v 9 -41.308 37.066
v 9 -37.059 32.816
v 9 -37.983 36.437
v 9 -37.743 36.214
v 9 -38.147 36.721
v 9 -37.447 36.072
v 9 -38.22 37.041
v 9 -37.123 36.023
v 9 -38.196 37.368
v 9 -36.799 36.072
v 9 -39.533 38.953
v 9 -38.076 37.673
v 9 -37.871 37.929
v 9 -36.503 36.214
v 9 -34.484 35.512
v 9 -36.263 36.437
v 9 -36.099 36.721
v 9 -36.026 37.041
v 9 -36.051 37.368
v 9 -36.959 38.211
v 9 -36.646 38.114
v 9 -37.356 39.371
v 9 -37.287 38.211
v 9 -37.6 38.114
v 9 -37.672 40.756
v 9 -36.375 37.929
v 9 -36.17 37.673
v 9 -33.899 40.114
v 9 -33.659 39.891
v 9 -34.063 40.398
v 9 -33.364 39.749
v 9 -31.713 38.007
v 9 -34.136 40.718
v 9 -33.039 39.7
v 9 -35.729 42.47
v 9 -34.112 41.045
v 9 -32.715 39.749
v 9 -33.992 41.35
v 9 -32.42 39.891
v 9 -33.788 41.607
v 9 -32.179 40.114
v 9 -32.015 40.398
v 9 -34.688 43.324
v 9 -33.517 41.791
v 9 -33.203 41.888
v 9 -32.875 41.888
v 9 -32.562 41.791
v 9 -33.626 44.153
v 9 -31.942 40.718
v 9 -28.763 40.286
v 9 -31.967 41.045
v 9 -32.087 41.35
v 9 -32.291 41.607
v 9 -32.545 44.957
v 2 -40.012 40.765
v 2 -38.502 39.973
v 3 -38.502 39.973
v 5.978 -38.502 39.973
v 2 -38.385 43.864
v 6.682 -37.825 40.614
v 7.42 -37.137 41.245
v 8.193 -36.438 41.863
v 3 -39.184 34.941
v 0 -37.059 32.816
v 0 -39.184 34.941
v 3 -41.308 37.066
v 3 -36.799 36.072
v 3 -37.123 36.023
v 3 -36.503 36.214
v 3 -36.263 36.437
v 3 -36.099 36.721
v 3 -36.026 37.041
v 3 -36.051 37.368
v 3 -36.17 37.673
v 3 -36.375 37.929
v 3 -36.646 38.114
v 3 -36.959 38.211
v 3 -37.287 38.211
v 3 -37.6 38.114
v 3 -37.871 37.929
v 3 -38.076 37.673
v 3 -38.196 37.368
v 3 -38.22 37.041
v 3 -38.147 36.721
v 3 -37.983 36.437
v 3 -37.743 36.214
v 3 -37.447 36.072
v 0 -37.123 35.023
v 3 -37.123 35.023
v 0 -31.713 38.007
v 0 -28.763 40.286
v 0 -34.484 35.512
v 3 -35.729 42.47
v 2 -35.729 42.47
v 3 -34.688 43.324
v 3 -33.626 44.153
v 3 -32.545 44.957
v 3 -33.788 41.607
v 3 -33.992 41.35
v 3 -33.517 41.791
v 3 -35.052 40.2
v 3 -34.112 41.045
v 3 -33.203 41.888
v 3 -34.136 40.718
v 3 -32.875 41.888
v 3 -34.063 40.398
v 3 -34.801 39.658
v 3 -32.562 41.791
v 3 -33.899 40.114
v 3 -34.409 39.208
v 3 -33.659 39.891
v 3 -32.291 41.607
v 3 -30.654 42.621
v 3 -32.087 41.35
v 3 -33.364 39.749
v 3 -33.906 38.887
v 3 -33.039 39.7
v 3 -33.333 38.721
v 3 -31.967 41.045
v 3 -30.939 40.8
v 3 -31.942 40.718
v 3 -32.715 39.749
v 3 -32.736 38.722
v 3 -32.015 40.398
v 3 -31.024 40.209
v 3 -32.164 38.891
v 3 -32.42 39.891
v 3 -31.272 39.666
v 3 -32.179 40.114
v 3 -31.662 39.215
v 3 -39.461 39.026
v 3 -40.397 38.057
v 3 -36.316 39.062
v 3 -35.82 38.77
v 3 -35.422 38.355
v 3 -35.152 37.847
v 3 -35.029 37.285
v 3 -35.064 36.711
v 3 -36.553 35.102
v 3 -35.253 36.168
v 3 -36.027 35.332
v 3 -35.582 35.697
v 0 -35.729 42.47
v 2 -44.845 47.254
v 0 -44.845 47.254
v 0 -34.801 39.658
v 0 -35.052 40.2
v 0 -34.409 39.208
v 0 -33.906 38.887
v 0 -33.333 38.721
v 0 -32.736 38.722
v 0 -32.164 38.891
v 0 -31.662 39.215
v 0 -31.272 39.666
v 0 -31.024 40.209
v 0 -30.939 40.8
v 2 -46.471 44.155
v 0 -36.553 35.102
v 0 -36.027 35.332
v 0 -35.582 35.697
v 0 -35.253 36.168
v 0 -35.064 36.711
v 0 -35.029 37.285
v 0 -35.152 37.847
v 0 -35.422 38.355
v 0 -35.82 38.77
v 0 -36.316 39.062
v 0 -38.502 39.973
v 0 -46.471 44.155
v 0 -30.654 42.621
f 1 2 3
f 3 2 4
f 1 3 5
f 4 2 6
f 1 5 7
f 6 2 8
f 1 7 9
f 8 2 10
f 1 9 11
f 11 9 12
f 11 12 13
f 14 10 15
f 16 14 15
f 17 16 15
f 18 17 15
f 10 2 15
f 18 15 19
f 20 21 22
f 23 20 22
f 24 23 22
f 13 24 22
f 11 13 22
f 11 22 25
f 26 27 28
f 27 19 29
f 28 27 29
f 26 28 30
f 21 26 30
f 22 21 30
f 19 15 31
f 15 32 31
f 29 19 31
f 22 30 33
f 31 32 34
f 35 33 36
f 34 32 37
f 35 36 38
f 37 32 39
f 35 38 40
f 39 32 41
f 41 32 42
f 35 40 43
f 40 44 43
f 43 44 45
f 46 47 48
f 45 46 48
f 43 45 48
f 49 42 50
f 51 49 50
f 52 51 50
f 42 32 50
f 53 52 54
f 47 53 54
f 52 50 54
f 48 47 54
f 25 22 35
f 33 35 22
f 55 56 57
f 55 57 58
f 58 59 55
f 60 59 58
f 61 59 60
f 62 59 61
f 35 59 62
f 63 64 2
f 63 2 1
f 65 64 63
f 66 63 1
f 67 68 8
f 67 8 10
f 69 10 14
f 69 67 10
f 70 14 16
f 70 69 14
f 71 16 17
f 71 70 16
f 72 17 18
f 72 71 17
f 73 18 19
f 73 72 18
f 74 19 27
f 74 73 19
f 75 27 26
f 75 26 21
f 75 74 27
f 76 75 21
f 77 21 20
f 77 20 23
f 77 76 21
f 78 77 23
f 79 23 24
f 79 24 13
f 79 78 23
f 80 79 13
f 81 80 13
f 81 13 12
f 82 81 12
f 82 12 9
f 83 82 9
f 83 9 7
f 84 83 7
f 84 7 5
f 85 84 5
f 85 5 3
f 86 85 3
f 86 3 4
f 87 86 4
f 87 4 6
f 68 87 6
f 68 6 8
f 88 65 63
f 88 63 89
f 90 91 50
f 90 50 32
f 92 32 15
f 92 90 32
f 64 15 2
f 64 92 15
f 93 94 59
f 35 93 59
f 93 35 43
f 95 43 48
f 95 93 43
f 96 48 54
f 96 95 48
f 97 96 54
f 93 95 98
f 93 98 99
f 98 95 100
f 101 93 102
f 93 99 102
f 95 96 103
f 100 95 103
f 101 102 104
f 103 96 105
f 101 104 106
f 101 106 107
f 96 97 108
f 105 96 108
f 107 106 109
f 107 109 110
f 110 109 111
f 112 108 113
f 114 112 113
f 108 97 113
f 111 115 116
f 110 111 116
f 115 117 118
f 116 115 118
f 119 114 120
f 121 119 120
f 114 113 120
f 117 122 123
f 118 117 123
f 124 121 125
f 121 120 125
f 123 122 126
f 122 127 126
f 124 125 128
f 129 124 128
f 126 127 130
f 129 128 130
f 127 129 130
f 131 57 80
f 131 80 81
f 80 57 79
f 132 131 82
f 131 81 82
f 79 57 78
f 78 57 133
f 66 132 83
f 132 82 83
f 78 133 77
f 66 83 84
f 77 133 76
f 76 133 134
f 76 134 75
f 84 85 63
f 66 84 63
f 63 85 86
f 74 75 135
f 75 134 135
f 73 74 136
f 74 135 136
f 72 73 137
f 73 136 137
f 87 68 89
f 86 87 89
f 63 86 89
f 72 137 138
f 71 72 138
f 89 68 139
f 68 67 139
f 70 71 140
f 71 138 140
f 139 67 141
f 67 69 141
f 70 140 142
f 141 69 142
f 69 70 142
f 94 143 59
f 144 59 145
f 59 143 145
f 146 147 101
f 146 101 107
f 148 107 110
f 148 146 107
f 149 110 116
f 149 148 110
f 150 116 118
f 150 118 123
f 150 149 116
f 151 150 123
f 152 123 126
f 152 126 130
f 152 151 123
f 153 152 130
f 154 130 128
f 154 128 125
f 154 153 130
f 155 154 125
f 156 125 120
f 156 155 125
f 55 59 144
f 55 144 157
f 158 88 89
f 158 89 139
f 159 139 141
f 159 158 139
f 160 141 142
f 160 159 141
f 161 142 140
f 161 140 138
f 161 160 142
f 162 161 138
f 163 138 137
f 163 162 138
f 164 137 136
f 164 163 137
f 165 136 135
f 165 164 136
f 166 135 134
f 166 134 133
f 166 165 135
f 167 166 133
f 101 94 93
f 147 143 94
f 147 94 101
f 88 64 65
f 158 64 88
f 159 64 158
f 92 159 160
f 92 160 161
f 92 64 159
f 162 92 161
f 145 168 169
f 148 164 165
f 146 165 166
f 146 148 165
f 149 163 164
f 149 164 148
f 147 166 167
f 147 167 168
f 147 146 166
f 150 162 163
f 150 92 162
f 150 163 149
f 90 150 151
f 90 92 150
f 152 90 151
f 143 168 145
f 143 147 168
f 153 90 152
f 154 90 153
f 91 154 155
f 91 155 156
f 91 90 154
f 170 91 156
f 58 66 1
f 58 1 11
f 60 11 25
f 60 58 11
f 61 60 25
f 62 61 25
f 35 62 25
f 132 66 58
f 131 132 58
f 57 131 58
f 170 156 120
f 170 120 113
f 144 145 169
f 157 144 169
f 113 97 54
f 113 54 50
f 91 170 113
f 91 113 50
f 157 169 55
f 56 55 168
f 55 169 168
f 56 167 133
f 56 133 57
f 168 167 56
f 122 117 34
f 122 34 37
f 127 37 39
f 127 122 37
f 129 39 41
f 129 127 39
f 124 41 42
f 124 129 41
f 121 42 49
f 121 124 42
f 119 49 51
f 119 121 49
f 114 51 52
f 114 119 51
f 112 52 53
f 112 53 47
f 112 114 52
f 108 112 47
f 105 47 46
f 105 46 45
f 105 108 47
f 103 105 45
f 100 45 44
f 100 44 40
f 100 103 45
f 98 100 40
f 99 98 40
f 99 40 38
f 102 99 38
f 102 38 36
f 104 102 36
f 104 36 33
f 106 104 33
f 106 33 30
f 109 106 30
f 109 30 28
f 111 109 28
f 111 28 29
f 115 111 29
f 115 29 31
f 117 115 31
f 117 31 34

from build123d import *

# Parameters (mm, degrees)
SKETCH_1_R          = 1.1
EXTRUDE_1_DEPTH     = 9
EXTRUDE_2_DEPTH     = 2
EXTRUDE_3_DEPTH     = 3.5
CUT_EXTRUDE_1_DEPTH = 3


with BuildPart() as part:
    # 草图1 → 凸台-拉伸1 (new body)
    with BuildSketch(Plane(origin=(0, 0, 0), x_dir=(0, 0, -1), z_dir=(1, 0, 0))):
        with BuildLine():
            Line((-44.956504104, -32.544780514), (-40.285971637, -28.762657896))
            ThreePointArc((-40.285971637, -28.762657896), (-36.785668861, -33.121965015), (-32.816123753, -37.05876444))
            Line((-32.816123753, -37.05876444), (-37.065731089, -41.308371776))
            ThreePointArc((-37.065731089, -41.308371776), (-41.244537814, -37.136748653), (-44.956504104, -32.544780514))
        make_face()
        with Locations((-40.800162976, -33.03932053)):
            Circle(SKETCH_1_R, mode=Mode.SUBTRACT)
        with Locations((-37.123106012, -37.123106012)):
            Circle(SKETCH_1_R, mode=Mode.SUBTRACT)
    extrude(amount=EXTRUDE_1_DEPTH)

    # 草图2 → 凸台-拉伸2 (add)
    with BuildSketch(Plane.ZY):
        with BuildLine():
            Line((42.469798969, -35.729066257), (47.254371389, -44.844869924))
            Line((47.254371389, -44.844869924), (44.155307417, -46.47146222))
            Line((44.155307417, -46.47146222), (39.972641515, -38.502440576))
            ThreePointArc((39.972641515, -38.502440576), (41.244537814, -37.136748653), (42.469798969, -35.729066257))
        make_face()
    extrude(amount=-EXTRUDE_2_DEPTH)

    # 草图3 → 凸台-拉伸3 (add)
    with BuildSketch(Plane(origin=(0, 9.759553772, 18.594383834), x_dir=(1, 0, 0), z_dir=(0, 0.4647406558327103, 0.8854468492327375))):
        Polygon((2, -51.373631369), (2, -54.373631369), (9, -51.373631369), align=None)
    extrude(amount=-EXTRUDE_3_DEPTH)

    # 草图4 → 切除-拉伸1 (cut)
    with BuildSketch(Plane.ZY):
        with BuildLine():
            Line((40.800162976, -30.93932053), (42.621237871, -30.653719205))
            Line((42.621237871, -30.653719205), (44.956504104, -32.544780514))
            ThreePointArc((44.956504104, -32.544780514), (43.74213685, -34.159558894), (42.469798969, -35.729066257))
            Line((42.469798969, -35.729066257), (40.199666496, -35.051633621))
            ThreePointArc((40.199666496, -35.051633621), (38.722200333, -32.735888076), (40.800162976, -30.93932053))
        make_face()
        with BuildLine():
            Line((34.940927421, -39.183568108), (35.023106012, -37.123106012))
            ThreePointArc((35.023106012, -37.123106012), (36.71133724, -35.063871573), (39.061626467, -36.315555119))
            Line((39.061626467, -36.315555119), (39.972641515, -38.502440576))
            ThreePointArc((39.972641515, -38.502440576), (38.544727601, -39.93186665), (37.065731089, -41.308371776))
            Line((37.065731089, -41.308371776), (34.940927421, -39.183568108))
        make_face()
    extrude(amount=-CUT_EXTRUDE_1_DEPTH, mode=Mode.SUBTRACT)


solid = part.part
